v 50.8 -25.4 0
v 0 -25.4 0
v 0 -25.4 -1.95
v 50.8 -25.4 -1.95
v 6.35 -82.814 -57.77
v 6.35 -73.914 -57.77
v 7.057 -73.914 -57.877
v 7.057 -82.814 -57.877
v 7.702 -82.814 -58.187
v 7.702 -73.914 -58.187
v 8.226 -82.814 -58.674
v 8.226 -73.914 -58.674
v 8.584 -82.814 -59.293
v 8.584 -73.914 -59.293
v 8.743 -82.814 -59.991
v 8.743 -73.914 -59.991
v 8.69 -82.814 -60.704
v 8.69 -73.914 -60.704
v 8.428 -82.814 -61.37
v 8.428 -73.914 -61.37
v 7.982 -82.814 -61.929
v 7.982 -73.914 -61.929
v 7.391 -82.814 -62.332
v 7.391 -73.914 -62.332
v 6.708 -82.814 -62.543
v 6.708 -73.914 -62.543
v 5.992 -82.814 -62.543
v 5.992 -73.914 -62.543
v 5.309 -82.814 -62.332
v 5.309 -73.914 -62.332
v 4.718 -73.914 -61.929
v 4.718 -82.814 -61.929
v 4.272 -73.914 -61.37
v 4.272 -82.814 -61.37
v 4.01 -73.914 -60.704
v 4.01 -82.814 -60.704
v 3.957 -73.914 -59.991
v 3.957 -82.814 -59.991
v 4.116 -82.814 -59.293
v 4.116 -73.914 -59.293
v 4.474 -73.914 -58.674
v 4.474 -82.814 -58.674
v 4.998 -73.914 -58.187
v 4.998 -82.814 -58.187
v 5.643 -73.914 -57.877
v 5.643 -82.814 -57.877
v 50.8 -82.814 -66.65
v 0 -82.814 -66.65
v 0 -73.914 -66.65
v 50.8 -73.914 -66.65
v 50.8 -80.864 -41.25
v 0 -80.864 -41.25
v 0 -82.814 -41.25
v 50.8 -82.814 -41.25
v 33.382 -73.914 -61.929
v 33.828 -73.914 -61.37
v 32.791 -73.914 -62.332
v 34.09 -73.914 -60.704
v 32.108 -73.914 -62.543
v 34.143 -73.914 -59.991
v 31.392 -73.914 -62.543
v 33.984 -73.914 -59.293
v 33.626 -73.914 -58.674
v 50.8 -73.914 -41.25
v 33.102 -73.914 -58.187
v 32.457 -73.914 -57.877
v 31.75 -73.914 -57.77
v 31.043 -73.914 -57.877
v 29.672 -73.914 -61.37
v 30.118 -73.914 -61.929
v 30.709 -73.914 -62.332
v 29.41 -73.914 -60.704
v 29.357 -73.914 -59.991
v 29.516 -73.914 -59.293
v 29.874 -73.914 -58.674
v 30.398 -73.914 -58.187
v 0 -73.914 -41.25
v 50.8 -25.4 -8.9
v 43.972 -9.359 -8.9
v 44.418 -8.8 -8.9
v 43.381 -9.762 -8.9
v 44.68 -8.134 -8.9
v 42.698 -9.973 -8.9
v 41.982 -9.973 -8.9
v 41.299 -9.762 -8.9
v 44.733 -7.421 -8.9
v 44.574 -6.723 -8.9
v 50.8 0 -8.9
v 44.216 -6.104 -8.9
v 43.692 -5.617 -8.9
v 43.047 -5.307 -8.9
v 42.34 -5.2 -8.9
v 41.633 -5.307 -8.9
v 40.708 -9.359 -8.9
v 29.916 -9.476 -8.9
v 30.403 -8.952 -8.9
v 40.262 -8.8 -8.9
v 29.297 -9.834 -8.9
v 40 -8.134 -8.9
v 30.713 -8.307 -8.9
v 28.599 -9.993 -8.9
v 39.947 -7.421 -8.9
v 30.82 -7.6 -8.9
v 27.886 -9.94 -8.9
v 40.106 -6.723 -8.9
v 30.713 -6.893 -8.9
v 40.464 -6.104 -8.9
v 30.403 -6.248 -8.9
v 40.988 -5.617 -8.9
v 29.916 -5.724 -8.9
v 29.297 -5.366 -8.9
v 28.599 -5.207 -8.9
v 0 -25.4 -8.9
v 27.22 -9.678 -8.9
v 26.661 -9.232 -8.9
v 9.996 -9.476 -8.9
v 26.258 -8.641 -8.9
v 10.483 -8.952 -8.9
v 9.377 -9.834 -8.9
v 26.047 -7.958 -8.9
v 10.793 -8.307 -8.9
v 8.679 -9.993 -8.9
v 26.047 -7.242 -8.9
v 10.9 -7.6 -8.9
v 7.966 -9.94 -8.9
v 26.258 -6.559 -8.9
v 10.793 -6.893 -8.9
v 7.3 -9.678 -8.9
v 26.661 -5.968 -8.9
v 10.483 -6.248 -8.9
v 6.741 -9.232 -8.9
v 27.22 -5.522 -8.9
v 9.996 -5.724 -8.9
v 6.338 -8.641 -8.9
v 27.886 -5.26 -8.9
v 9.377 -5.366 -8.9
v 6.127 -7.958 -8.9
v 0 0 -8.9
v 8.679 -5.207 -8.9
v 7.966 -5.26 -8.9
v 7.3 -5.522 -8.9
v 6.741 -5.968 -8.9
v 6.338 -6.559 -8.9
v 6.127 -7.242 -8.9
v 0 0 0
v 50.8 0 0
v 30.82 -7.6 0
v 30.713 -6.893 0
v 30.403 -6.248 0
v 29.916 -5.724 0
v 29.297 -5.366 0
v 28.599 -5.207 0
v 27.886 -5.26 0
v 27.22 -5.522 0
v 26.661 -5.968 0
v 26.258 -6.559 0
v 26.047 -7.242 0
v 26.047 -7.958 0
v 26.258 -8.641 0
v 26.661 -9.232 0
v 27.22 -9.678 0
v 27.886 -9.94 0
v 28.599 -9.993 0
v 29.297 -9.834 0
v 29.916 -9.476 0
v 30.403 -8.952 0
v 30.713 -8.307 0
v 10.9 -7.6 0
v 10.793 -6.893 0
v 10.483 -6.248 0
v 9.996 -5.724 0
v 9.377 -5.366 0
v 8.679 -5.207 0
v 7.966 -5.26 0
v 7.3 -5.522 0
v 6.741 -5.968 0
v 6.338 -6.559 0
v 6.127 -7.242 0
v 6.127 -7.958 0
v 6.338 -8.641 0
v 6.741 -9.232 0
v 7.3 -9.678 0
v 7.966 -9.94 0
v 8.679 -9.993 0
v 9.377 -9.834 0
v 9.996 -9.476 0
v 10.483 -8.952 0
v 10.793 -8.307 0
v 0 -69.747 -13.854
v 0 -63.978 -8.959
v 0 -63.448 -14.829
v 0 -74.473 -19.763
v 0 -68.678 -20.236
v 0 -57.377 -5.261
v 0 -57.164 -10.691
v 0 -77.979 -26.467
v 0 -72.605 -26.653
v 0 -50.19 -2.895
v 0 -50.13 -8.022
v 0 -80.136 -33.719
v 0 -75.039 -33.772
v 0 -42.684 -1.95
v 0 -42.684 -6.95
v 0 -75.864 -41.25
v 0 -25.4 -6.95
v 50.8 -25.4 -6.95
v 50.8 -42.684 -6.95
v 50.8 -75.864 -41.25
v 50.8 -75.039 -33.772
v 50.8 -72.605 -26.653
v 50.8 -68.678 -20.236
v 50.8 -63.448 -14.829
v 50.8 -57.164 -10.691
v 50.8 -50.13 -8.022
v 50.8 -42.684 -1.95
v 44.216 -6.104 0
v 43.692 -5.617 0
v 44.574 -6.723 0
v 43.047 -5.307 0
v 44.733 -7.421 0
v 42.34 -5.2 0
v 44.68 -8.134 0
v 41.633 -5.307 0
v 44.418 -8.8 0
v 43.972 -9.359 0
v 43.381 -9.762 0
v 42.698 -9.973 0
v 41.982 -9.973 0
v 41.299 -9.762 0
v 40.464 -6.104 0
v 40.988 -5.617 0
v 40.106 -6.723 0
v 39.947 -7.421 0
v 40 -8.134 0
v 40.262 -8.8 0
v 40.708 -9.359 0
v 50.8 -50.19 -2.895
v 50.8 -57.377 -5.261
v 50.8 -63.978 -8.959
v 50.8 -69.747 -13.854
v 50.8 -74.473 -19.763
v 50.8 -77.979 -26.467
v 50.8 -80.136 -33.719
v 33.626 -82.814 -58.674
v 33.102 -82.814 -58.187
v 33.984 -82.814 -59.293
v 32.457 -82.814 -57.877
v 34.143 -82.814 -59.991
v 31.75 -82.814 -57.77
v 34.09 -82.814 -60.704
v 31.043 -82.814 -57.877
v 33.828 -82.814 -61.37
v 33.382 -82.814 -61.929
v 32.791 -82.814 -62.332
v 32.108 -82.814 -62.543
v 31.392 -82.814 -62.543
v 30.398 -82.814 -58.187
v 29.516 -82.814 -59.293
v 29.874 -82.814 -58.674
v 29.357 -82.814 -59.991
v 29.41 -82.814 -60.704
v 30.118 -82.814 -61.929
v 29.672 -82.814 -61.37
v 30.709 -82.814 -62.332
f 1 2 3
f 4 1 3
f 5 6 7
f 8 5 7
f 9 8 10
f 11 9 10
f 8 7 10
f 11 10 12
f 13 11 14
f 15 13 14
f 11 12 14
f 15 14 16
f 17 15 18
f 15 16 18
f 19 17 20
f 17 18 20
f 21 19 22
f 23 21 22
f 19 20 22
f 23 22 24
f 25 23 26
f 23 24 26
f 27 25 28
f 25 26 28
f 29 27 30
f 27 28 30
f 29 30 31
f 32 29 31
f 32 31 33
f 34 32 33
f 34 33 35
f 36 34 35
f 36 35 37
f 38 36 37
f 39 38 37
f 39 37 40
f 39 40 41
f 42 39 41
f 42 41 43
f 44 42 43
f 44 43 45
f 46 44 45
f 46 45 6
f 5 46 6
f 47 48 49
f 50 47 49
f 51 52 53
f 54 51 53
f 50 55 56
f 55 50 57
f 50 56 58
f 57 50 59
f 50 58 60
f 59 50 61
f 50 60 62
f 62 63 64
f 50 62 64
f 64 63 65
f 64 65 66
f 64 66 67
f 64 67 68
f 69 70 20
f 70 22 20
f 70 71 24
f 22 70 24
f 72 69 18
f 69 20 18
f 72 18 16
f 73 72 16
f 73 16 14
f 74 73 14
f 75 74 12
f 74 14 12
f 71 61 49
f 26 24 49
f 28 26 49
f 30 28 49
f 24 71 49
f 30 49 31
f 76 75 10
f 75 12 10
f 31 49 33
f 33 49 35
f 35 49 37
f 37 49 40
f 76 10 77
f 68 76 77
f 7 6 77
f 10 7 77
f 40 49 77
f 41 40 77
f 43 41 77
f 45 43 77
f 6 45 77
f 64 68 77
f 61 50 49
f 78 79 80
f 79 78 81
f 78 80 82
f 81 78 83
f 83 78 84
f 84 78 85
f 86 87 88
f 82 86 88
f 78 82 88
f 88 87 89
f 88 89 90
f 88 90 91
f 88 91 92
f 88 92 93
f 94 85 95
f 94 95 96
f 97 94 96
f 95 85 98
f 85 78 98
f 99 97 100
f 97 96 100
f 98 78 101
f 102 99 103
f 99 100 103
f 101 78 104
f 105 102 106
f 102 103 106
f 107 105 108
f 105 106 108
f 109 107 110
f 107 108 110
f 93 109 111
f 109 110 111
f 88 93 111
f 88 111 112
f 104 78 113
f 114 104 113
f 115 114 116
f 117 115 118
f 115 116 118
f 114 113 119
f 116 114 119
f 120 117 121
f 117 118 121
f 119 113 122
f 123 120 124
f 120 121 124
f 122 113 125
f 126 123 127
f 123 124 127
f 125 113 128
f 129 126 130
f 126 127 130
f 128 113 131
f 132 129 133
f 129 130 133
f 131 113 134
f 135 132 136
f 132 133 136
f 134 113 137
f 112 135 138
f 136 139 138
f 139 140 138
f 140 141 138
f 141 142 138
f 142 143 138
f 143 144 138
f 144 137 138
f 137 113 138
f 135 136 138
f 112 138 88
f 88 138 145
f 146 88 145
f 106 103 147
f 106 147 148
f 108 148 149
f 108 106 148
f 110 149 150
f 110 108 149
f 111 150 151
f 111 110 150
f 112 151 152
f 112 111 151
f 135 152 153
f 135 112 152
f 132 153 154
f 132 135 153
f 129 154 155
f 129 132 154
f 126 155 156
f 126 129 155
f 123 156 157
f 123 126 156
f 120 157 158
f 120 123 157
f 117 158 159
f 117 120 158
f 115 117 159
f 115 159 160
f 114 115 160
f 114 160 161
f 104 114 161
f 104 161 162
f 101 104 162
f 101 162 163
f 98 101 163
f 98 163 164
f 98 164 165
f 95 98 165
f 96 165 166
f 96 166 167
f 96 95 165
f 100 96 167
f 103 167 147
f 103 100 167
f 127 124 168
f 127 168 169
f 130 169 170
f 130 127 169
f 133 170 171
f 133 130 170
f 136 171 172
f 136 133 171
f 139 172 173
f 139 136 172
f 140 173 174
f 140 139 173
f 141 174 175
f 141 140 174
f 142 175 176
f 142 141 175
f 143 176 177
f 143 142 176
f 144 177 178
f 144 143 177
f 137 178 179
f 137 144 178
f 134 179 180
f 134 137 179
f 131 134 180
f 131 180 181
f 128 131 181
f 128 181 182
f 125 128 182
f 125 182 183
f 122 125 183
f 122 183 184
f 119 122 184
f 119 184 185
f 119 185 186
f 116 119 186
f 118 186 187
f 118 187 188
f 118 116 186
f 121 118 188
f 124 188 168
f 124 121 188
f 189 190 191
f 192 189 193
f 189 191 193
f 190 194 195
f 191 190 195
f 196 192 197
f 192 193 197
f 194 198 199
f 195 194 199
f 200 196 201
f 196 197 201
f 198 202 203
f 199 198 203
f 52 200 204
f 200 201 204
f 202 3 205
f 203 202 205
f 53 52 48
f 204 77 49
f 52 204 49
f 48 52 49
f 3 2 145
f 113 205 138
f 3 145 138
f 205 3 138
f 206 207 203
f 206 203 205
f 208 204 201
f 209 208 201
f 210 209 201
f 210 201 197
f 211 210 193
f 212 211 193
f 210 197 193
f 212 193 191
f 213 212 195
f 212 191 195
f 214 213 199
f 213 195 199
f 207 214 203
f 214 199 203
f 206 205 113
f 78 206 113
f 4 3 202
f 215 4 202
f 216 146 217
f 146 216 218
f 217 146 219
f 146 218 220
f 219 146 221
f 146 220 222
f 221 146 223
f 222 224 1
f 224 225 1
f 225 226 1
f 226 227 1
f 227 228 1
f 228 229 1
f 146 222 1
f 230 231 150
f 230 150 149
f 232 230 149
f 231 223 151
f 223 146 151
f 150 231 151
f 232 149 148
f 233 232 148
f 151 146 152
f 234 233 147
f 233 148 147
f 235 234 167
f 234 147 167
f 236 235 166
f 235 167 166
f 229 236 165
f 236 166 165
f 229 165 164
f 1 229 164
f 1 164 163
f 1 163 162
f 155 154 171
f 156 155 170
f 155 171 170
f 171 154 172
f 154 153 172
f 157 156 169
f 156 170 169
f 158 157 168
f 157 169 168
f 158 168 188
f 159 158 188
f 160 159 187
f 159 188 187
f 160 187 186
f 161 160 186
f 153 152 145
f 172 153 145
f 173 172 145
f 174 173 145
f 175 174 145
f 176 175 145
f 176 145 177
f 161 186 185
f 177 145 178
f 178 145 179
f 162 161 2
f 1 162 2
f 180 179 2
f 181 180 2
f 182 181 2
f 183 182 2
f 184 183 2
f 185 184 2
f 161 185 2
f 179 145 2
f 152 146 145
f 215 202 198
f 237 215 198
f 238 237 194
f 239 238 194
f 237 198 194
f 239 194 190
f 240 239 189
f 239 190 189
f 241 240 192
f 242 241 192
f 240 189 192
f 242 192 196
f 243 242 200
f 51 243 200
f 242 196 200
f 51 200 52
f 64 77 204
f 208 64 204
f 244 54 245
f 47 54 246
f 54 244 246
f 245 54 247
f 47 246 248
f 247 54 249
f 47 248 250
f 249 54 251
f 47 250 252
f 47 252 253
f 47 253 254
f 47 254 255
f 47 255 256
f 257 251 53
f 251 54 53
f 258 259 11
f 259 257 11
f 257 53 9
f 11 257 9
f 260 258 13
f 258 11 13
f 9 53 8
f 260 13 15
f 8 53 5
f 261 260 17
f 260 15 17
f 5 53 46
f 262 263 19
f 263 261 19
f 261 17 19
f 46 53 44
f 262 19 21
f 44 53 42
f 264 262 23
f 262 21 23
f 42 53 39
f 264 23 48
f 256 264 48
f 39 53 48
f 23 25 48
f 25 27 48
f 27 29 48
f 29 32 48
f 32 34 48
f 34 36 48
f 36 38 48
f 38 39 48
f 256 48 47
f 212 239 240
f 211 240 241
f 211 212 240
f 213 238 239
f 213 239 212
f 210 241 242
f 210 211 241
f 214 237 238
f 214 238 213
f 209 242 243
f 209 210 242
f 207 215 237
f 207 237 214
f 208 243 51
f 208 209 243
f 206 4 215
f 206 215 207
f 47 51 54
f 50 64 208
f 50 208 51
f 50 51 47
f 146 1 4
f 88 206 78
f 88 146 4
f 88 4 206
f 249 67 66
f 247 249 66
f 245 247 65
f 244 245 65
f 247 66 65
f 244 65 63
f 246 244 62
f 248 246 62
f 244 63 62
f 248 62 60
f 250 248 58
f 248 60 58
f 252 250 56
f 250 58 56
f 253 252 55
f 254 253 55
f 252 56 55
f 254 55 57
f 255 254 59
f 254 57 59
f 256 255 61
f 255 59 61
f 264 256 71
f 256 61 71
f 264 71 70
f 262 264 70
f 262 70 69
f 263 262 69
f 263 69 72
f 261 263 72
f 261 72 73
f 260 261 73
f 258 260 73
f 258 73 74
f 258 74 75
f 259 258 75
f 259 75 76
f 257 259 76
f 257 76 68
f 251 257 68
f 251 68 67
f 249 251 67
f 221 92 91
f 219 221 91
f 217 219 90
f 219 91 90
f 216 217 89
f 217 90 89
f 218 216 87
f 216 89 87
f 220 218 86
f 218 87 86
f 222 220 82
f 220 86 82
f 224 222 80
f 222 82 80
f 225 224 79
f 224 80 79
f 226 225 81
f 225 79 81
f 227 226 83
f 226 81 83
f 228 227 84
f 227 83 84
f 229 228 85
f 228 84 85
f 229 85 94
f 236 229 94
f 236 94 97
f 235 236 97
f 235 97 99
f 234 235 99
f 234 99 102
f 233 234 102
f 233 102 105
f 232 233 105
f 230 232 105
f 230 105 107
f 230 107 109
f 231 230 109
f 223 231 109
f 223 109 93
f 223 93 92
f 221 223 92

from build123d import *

# Parameters (mm, degrees)
BOSS_EXTRUDE1_DEPTH = 50.8
CUT_EXTRUDE1_REACH  = 113.741
SKETCH2_R           = 2.4
CUT_EXTRUDE2_REACH  = 115.022
SKETCH3_R           = 2.4
LPATTERN1_START     = -8.9
LPATTERN1_OUTLINE_R = 2.4
LPATTERN1_DEPTH     = 8.9


# Read off the part's stored shape, not the designer's step: LPattern1
with BuildPart() as part:
    # Sketch1 → Boss-Extrude1 (new body)
    with BuildSketch(Plane(origin=(0, 0, 0), x_dir=(0, 0, -1), z_dir=(1, 0, 0))):
        with BuildLine():
            Line((0, -25.4), (1.95, -25.4))
            Line((1.95, -25.4), (1.95, -42.683768749))
            ThreePointArc((1.95, -42.683768749), (13.853740865, -69.747329637), (41.25, -80.864))
            Line((41.25, -80.864), (41.25, -82.814))
            Line((41.25, -82.814), (66.65, -82.814))
            Line((66.65, -82.814), (66.65, -73.914))
            Line((66.65, -73.914), (41.25, -73.914))
            Line((41.25, -73.914), (41.25, -75.864))
            ThreePointArc((41.25, -75.864), (17.388850898, -66.211521802), (6.95, -42.683768749))
            Line((6.95, -42.683768749), (6.95, -25.4))
            Line((6.95, -25.4), (8.9, -25.4))
            Line((8.9, -25.4), (8.9, 0))
            Line((8.9, 0), (0, 0))
            Line((0, 0), (0, -25.4))
        make_face()
    extrude(amount=BOSS_EXTRUDE1_DEPTH)

    # Sketch2 → Cut-Extrude1 (cut, up to next)
    with BuildSketch(Plane(origin=(0, -73.914, 0), x_dir=(1, 0, 0), z_dir=(0, 1, 0)), mode=Mode.PRIVATE) as cut_extrude1_sk1:
        with Locations(Location((6.35, 60.17, 0), (0, 0, 270))):
            Circle(SKETCH2_R)
    cut_extrude1_tool1 = extrude(cut_extrude1_sk1.sketch, amount=-CUT_EXTRUDE1_REACH, mode=Mode.PRIVATE) & part.part
    # Sketch2 → Cut-Extrude1 (cut, up to next)
    with BuildSketch(Plane(origin=(0, -73.914, 0), x_dir=(1, 0, 0), z_dir=(0, 1, 0)), mode=Mode.PRIVATE) as cut_extrude1_sk2:
        with Locations(Location((31.75, 60.17, 0), (0, 0, 270))):
            Circle(SKETCH2_R)
    cut_extrude1_tool2 = extrude(cut_extrude1_sk2.sketch, amount=-CUT_EXTRUDE1_REACH, mode=Mode.PRIVATE) & part.part
    add(cut_extrude1_tool1.solids().sort_by_distance((6.35, -73.914, -60.17))[0], mode=Mode.SUBTRACT)
    add(cut_extrude1_tool2.solids().sort_by_distance((31.75, -73.914, -60.17))[0], mode=Mode.SUBTRACT)

    # Sketch3 → Cut-Extrude2 (cut, up to next)
    with BuildSketch(Plane(origin=(0, 0, -8.9), x_dir=(-1, 0, 0), z_dir=(0, 0, -1)), mode=Mode.PRIVATE) as cut_extrude2_sk1:
        with Locations(Location((-42.34, -7.6, 0), (0, 0, 90))):
            Circle(SKETCH3_R)
    cut_extrude2_tool1 = extrude(cut_extrude2_sk1.sketch, amount=-CUT_EXTRUDE2_REACH, mode=Mode.PRIVATE) & part.part
    add(cut_extrude2_tool1.solids().sort_by_distance((42.34, -7.6, -8.9))[0], mode=Mode.SUBTRACT)

    # LPattern1 outline → LPattern1 (cut)
    with BuildSketch(Plane.XY.offset(LPATTERN1_START)):
        with Locations((8.5, -7.6)):
            Circle(LPATTERN1_OUTLINE_R)
        with Locations((28.42, -7.6)):
            Circle(LPATTERN1_OUTLINE_R)
    extrude(amount=LPATTERN1_DEPTH, mode=Mode.SUBTRACT)


solid = part.part
